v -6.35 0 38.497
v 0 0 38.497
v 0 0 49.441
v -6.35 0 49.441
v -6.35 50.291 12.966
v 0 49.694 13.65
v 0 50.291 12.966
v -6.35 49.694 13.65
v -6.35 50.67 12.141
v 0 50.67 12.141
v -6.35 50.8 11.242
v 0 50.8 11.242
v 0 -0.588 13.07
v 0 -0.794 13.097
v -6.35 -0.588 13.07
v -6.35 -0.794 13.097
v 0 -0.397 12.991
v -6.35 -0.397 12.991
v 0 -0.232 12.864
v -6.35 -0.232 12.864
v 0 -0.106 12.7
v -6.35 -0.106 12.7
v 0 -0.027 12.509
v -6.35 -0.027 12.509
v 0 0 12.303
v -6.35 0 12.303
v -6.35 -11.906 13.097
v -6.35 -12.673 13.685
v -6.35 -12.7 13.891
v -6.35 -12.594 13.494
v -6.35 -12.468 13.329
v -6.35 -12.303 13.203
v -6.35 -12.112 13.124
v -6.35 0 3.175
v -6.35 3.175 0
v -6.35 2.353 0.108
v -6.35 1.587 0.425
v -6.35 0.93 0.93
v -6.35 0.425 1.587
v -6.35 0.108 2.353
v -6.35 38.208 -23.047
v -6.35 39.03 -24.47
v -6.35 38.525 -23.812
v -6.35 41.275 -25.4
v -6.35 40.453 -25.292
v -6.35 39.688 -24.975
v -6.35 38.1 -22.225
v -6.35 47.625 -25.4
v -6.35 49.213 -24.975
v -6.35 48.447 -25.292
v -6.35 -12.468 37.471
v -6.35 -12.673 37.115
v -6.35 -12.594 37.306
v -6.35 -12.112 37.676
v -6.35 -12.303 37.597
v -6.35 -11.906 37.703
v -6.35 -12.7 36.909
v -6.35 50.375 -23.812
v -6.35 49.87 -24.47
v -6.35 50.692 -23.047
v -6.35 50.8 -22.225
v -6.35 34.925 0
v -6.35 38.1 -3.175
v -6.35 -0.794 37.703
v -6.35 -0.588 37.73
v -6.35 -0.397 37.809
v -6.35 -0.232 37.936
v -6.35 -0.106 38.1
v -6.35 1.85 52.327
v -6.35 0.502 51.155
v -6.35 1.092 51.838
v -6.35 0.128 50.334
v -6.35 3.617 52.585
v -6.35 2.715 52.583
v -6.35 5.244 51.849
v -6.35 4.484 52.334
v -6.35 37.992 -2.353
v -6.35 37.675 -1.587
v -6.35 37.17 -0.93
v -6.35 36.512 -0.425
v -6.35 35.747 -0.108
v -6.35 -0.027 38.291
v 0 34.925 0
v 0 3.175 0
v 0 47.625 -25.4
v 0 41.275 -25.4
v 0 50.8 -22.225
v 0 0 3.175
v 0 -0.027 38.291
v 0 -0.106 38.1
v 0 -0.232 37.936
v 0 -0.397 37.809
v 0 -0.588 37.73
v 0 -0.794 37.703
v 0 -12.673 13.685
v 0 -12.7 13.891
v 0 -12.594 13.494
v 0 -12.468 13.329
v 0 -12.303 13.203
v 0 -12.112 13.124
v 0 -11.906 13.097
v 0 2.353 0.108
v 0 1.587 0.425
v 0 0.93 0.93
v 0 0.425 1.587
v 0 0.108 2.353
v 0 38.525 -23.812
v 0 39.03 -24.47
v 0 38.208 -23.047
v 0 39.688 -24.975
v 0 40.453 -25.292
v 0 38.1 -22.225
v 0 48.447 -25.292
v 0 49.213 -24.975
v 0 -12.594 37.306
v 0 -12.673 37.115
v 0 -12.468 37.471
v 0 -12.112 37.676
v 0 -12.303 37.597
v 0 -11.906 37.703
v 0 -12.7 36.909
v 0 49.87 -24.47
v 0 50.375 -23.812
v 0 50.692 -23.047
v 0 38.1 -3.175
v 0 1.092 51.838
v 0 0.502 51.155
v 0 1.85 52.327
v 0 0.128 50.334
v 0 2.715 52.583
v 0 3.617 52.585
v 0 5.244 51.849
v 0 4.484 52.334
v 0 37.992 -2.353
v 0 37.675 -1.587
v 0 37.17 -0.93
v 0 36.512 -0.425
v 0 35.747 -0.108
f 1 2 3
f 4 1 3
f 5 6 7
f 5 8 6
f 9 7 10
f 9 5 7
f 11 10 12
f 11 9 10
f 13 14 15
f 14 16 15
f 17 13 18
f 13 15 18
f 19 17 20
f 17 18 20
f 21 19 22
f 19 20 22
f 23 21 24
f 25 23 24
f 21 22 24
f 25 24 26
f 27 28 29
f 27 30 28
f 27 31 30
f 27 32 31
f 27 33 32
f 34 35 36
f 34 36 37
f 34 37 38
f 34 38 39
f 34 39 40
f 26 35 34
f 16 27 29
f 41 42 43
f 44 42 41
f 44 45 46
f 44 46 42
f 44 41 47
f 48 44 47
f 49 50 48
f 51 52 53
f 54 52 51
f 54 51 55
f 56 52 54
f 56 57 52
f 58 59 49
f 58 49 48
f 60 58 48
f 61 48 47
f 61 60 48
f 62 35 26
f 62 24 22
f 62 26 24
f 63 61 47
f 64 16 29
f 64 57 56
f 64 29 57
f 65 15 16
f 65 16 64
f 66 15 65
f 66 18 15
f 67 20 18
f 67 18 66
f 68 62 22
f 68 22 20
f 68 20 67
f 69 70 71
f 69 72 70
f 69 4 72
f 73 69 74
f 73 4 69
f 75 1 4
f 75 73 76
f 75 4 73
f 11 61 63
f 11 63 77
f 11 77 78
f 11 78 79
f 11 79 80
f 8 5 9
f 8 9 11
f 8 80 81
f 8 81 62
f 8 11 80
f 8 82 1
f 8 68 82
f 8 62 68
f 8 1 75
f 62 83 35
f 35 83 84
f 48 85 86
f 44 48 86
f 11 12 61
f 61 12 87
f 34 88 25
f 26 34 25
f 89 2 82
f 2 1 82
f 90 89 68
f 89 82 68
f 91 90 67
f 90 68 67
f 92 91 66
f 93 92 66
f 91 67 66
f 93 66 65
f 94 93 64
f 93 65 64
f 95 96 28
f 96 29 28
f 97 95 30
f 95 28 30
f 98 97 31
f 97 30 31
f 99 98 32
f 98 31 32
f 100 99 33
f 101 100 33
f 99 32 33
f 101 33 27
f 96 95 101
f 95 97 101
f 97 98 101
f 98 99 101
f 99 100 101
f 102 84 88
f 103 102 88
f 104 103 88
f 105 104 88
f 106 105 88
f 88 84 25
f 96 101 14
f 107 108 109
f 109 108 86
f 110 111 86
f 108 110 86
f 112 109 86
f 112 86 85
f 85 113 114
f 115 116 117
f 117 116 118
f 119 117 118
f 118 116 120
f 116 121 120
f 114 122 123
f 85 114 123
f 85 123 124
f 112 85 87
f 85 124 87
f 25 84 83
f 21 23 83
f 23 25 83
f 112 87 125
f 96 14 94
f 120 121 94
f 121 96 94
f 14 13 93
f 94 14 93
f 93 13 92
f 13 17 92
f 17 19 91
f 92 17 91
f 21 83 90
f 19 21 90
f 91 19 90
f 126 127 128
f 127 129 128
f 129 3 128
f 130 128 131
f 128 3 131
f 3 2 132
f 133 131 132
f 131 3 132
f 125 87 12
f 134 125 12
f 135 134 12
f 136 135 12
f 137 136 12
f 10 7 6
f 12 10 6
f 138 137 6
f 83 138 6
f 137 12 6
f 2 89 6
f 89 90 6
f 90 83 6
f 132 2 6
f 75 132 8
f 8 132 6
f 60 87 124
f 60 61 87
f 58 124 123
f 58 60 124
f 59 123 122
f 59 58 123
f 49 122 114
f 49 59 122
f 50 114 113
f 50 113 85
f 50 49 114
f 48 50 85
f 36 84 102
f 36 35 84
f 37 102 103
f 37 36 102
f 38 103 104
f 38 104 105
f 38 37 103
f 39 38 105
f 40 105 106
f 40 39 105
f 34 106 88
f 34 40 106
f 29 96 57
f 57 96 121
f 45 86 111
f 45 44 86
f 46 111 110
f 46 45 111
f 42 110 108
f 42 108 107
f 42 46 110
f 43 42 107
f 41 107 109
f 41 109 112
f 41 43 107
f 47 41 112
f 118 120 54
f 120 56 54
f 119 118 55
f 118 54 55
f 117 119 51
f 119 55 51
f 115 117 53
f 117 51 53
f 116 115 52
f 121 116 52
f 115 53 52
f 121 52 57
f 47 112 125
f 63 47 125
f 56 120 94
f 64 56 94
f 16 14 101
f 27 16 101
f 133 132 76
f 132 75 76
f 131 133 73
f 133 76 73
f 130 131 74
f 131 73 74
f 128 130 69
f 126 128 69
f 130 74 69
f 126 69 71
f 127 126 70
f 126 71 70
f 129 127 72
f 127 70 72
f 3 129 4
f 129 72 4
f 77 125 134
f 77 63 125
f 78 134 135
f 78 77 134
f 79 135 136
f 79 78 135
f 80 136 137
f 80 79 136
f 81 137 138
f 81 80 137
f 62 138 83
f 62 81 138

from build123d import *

# Parameters (mm, degrees)
BASE_FLANGE1_DEPTH = 6.35
FILLET1_R          = 3.175
FILLET2_R          = 0.79375


# Sheet-metal steps are written as plain solids
with BuildPart() as part:
    # Sketch1 → Base-Flange1 (new body)
    with BuildSketch(Plane(origin=(0, 0, 0), x_dir=(0, 0, -1), z_dir=(1, 0, 0))):
        Polygon((-56.35625, 0), (-12.7, 50.8), (25.4, 50.8), (25.4, 38.1), (0, 38.1), (0, 0), (-13.096875, 0), (-13.096875, -12.7), (-37.703125, -12.7), (-37.703125, 0), align=None)
    extrude(amount=-BASE_FLANGE1_DEPTH)

    # Fillet1
    fillet1_edges = [part.edges().sort_by_distance(p)[0] for p in [
        (-3.175, 0, 56.35625),
        (-3.175, 50.8, 12.7),
        (-3.175, 50.8, -25.4),
        (-3.175, 38.1, -25.4),
        (-3.175, 38.1, 0),
        (-3.175, 0, 0),
    ]]
    fillet(fillet1_edges, radius=FILLET1_R)

    # Fillet2
    fillet2_edges = [part.edges().sort_by_distance(p)[0] for p in [
        (-3.175, 0, 13.096875),
        (-3.175, -12.7, 13.096875),
        (-3.175, -12.7, 37.703125),
        (-3.175, 0, 37.703125),
    ]]
    fillet(fillet2_edges, radius=FILLET2_R)


solid = part.part
